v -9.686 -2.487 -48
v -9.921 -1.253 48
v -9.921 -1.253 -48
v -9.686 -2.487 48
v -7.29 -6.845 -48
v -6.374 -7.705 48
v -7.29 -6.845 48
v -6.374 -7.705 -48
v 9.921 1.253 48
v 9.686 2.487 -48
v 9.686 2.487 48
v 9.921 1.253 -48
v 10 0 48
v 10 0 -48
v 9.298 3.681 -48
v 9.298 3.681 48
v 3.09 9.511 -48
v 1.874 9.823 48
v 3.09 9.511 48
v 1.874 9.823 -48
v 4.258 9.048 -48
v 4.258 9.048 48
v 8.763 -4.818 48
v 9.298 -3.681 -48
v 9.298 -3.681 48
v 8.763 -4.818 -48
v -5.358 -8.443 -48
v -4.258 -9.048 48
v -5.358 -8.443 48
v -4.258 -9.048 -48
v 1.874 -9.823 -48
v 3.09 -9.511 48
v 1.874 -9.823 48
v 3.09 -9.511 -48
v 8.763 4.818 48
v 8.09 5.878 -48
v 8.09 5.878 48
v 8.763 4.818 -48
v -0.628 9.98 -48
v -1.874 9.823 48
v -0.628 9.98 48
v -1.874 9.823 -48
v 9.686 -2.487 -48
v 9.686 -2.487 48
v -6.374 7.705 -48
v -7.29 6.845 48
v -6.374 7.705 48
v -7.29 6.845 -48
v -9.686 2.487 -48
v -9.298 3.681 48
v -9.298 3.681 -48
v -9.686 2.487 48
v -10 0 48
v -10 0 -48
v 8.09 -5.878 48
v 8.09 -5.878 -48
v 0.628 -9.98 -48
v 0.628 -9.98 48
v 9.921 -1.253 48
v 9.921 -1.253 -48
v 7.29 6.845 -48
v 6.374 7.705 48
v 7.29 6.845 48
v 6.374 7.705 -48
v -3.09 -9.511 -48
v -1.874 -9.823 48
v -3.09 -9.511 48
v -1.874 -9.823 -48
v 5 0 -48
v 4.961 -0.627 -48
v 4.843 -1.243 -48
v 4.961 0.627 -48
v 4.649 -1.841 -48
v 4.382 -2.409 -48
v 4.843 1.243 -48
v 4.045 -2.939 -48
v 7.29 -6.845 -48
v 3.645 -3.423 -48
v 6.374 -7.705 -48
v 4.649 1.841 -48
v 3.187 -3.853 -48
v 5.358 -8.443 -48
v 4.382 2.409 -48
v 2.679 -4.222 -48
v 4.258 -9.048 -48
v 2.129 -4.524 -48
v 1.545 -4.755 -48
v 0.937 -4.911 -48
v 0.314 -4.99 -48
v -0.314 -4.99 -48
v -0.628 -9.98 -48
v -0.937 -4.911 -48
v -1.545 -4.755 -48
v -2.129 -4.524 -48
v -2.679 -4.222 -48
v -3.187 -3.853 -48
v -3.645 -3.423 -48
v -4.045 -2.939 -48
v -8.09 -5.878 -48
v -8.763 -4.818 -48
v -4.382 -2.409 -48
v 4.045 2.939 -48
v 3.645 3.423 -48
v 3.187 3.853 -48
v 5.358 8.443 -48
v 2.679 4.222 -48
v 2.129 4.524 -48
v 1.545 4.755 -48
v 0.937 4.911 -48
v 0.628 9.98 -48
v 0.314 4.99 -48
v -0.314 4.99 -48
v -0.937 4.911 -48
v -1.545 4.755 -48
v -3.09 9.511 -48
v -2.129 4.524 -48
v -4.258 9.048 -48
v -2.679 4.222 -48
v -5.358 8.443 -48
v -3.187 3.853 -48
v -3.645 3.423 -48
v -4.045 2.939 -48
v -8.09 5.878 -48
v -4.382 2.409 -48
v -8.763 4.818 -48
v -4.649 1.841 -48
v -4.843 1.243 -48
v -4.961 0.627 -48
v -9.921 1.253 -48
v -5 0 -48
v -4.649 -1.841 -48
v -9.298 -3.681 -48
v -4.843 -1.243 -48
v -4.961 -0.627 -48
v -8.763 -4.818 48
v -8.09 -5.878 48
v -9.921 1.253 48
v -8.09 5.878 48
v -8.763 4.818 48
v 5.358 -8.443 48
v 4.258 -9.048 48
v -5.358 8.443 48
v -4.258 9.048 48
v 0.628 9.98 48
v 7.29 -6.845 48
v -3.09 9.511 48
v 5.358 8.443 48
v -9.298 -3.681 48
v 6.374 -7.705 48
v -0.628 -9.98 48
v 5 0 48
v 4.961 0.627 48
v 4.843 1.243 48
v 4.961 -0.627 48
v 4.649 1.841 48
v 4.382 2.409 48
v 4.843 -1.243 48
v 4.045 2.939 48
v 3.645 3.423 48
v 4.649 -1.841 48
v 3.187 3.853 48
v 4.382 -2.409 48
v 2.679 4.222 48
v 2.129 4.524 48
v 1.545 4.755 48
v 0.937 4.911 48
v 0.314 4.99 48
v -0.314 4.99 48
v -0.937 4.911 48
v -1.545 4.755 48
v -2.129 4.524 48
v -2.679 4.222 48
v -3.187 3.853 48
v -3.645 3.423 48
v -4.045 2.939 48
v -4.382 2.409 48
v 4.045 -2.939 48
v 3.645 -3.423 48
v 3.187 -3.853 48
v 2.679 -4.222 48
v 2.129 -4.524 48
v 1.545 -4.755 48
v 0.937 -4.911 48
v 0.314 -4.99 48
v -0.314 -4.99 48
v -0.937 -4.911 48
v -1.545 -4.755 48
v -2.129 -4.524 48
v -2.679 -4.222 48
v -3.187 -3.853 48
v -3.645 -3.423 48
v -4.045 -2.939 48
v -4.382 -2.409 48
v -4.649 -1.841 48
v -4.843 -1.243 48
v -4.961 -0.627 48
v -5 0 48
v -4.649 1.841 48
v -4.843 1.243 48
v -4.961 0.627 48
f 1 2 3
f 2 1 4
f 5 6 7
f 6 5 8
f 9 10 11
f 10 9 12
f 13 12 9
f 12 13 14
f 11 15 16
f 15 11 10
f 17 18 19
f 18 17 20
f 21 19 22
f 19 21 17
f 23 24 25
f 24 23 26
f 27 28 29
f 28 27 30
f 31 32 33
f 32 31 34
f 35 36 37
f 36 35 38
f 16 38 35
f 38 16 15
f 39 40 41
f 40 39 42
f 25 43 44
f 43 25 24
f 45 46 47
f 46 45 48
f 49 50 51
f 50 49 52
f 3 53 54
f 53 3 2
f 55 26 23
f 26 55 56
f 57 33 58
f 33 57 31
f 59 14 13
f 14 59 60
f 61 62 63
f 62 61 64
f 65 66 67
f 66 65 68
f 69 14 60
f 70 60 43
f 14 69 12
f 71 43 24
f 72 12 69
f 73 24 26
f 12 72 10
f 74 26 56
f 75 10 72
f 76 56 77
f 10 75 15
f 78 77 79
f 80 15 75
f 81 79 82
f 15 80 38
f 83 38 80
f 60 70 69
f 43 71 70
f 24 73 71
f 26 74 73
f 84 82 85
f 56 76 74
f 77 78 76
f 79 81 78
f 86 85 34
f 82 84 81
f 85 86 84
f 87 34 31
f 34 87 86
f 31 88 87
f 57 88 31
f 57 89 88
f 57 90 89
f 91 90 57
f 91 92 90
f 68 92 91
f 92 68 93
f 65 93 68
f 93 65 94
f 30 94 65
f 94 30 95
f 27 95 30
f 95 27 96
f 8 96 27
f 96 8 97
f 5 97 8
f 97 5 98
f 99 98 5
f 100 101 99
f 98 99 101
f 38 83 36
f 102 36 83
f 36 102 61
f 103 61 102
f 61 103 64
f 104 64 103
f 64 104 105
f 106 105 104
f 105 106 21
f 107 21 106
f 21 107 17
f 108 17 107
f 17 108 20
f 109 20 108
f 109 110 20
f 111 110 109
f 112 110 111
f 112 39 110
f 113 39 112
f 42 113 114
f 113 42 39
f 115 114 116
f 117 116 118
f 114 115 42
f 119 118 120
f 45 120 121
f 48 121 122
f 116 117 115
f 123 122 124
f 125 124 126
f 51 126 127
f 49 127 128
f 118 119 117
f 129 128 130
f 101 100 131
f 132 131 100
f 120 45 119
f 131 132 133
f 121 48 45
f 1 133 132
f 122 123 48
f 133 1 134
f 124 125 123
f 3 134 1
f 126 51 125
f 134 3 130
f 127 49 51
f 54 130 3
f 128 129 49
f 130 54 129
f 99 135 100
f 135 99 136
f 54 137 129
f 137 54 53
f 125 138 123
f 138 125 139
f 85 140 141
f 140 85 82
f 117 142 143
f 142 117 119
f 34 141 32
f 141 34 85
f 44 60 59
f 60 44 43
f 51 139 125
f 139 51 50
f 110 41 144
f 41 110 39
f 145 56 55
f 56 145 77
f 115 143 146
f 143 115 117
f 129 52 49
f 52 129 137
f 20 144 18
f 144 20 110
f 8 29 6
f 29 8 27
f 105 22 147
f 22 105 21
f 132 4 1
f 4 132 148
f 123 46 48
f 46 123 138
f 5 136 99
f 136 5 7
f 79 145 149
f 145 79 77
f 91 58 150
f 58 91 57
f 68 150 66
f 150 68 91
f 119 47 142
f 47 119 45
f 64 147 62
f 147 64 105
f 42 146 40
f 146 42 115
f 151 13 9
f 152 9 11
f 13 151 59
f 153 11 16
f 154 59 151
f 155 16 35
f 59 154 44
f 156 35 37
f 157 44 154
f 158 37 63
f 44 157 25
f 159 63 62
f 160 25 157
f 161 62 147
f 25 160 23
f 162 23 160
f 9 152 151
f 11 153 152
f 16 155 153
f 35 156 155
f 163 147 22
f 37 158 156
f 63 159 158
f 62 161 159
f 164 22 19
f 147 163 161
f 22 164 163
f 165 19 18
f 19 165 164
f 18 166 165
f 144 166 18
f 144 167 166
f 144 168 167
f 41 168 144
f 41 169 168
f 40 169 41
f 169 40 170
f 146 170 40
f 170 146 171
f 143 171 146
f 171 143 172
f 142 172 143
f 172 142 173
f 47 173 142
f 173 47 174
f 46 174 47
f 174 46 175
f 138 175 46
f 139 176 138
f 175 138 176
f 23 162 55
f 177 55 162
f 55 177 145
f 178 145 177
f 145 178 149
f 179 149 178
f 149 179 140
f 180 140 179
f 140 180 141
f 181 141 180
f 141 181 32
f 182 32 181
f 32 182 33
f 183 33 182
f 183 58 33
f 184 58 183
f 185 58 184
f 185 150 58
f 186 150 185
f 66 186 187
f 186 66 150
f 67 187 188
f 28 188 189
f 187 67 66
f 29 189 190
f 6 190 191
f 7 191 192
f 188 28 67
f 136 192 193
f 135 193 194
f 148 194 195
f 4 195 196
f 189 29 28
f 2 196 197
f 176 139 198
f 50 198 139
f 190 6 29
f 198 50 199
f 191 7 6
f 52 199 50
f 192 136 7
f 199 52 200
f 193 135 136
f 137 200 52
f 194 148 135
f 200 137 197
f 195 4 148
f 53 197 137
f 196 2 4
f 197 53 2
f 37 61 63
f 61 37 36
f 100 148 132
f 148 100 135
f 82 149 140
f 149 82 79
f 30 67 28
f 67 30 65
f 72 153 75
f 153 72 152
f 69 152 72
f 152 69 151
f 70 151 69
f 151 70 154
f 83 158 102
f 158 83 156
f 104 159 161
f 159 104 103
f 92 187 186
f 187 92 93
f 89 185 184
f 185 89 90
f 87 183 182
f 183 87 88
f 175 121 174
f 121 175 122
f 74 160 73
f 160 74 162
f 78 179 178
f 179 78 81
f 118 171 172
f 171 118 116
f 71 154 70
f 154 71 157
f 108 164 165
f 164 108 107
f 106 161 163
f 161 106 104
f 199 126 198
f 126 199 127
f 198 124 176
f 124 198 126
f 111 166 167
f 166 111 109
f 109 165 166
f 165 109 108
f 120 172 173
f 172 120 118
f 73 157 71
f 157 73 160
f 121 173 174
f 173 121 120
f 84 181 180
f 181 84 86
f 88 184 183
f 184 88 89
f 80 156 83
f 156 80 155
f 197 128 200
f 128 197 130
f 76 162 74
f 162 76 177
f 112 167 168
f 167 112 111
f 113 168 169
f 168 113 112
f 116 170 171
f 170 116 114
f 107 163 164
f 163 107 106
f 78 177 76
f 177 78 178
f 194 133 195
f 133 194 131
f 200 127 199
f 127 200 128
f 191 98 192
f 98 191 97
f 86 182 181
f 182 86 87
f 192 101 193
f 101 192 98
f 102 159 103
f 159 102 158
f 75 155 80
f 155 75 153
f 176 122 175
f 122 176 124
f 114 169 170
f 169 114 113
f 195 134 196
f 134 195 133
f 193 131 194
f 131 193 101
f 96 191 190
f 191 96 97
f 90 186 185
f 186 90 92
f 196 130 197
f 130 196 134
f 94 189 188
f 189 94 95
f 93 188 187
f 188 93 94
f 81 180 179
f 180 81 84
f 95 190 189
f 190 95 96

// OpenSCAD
$fn = 50;


difference() {
	union() {
		translate(v = [0, 0, -48.0000000000]) {
			cylinder(h = 96, r = 10.0000000000);
		}
	}
	union() {
		translate(v = [0, 0, -100.0000000000]) {
			cylinder(h = 200, r = 5.0000000000);
		}
	}
}
